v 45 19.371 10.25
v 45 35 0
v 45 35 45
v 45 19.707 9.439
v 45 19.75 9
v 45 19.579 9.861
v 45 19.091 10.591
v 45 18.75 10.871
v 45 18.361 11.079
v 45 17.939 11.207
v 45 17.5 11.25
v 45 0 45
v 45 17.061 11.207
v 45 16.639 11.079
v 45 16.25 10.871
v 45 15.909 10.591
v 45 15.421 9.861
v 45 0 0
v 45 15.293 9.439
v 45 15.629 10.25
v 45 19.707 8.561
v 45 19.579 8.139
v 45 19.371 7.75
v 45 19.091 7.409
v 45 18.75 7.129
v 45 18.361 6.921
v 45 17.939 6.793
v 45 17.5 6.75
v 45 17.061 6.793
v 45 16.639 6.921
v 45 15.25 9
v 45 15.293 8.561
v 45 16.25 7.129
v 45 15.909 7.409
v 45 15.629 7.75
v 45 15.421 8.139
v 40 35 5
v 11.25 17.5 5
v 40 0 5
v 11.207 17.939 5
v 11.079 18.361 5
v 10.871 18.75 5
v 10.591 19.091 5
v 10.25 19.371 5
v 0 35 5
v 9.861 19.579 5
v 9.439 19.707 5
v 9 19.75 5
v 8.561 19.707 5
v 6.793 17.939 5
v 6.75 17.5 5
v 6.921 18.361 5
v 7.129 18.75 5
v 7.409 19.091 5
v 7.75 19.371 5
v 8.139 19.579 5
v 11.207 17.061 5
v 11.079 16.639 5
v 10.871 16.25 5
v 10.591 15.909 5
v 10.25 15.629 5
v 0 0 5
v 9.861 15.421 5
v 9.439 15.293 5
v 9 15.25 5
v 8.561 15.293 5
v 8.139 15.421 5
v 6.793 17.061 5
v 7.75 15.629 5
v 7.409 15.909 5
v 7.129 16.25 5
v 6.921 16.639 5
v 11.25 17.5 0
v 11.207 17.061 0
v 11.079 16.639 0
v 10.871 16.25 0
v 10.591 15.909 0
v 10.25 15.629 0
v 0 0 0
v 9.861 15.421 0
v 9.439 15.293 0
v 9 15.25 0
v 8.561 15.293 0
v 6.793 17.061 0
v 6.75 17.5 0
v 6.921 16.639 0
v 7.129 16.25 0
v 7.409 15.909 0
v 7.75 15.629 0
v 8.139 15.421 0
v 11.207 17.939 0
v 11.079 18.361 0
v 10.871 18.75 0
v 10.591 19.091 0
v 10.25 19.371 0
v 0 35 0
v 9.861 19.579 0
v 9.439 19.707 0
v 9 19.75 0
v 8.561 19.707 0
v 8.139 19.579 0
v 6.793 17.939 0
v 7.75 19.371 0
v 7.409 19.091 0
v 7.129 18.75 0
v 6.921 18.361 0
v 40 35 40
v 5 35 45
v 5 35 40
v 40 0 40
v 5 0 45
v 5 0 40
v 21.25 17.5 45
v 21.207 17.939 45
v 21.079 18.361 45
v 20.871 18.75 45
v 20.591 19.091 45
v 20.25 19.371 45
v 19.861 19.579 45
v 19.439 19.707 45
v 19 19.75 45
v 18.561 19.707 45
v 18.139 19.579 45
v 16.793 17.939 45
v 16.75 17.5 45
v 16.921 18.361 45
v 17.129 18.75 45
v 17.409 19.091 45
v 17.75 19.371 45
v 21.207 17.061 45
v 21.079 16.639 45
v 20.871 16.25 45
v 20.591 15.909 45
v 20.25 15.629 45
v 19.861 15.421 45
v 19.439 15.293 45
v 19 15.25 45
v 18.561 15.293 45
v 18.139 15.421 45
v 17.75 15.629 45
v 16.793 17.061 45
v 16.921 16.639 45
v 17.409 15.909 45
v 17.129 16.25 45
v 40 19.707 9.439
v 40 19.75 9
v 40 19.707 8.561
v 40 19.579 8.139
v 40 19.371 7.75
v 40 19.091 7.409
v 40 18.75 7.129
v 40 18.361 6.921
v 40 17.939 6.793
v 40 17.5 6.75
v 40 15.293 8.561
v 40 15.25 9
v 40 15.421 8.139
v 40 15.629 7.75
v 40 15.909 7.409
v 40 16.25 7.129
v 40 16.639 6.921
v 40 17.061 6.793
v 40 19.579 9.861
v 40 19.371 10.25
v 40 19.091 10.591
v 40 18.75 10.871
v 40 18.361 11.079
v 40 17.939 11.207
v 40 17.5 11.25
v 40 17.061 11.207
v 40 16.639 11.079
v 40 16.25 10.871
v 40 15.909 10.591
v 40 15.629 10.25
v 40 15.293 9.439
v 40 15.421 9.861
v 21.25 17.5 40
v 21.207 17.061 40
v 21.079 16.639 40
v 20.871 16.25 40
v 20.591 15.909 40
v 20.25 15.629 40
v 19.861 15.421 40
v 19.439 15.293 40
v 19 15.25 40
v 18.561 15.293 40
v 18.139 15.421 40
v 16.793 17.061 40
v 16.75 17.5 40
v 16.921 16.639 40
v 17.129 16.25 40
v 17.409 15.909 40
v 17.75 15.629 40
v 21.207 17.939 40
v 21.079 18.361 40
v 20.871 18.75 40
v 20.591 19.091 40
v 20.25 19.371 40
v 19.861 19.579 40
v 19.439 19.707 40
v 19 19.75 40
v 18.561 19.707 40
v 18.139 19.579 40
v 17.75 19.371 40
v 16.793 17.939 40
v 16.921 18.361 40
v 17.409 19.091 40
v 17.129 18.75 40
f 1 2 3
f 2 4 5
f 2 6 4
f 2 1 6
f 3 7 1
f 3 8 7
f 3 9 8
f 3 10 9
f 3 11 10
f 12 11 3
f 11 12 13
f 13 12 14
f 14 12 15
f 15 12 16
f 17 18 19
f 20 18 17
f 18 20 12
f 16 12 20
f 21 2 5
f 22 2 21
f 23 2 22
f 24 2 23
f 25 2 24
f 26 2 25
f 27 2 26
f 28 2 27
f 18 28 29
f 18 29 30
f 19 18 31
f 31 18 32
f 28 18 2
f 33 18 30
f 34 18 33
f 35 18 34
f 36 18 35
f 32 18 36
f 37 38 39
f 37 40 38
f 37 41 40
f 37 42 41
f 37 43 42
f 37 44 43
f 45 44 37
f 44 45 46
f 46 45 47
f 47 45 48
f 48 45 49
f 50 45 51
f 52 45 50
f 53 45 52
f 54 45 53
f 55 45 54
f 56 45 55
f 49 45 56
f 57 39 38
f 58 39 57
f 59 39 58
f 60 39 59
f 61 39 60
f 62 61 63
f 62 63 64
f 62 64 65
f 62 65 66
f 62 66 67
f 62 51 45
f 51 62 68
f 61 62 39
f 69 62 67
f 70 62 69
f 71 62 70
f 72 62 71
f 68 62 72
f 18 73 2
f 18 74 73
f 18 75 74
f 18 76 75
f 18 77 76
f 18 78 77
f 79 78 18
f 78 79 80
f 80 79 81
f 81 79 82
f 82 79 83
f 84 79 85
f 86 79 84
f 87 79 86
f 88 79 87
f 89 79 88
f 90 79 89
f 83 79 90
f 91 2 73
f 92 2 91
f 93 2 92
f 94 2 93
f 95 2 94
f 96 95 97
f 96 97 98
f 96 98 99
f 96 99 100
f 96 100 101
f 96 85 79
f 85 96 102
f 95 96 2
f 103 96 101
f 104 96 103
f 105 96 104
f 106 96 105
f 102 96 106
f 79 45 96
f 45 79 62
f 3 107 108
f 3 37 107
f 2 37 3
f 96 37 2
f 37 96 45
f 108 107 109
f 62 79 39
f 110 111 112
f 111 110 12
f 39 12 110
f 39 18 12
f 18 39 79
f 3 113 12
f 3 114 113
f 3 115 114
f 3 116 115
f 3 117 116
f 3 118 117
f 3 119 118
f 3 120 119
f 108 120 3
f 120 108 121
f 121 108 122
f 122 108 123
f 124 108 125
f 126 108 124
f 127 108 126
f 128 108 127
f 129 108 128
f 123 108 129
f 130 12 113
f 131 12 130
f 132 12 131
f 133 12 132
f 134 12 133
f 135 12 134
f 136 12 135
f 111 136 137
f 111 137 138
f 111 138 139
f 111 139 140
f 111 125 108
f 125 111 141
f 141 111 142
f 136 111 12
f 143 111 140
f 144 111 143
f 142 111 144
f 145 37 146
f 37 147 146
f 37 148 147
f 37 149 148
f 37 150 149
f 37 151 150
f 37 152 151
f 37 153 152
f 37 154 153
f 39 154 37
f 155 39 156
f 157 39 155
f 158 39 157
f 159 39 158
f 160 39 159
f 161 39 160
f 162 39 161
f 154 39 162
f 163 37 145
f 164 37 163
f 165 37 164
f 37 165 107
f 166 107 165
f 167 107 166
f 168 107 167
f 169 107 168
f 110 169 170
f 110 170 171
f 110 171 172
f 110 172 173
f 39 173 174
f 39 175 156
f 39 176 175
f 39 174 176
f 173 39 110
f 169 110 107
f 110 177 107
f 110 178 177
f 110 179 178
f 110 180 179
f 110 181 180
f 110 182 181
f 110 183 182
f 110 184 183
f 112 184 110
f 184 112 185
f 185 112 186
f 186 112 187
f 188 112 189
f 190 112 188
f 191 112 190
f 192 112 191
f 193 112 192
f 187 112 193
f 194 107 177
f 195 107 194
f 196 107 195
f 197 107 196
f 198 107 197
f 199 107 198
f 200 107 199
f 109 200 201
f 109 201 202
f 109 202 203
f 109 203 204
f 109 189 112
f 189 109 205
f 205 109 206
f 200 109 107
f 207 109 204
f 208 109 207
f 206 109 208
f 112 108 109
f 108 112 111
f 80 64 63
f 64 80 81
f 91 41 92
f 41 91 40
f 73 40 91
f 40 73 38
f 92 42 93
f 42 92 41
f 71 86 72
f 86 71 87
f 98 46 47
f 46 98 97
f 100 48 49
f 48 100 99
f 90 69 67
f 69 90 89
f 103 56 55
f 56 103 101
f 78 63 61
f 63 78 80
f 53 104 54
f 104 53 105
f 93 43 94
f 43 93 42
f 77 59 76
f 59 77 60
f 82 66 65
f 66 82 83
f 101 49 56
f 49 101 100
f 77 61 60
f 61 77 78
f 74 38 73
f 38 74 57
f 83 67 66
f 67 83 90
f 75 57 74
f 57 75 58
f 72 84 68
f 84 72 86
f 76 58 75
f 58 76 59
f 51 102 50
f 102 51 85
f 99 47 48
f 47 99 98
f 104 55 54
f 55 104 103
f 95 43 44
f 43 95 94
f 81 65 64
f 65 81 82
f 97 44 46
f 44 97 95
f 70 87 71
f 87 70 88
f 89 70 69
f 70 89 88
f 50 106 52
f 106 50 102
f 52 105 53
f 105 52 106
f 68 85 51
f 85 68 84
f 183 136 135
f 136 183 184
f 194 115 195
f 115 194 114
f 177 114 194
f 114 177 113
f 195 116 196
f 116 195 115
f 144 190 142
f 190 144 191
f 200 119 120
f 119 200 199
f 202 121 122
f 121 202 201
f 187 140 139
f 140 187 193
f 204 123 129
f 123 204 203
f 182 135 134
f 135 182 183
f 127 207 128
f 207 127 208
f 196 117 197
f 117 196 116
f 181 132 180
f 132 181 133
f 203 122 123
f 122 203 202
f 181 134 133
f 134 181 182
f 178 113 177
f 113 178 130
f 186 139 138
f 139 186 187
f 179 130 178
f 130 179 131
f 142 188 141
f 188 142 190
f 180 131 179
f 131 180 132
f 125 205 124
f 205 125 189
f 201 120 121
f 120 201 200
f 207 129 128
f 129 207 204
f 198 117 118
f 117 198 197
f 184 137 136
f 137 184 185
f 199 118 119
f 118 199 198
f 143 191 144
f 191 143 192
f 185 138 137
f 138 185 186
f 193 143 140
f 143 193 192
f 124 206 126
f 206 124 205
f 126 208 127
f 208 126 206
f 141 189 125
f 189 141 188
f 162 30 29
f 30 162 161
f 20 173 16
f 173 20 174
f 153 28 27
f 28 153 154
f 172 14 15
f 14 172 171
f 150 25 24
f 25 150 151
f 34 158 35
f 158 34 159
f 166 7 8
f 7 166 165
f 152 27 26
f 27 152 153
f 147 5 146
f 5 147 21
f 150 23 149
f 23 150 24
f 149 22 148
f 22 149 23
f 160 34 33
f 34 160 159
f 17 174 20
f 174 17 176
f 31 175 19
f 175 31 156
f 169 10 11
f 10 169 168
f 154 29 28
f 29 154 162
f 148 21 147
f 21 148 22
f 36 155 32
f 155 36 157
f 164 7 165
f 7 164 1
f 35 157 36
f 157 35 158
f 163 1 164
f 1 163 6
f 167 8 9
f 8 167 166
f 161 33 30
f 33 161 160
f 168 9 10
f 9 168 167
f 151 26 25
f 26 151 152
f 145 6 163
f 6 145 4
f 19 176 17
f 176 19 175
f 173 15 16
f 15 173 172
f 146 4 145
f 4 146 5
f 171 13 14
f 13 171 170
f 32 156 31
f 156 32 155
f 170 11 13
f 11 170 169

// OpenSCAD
$fn = 32;

// ----------------------------------------------------------------------
// Z-bracket: 45 x 35 x 45 mm
// ----------------------------------------------------------------------

// --- parameters (mm) ---
foot_len = 45;            // lower foot length, X
top_len = 35;             // upper foot length, X
depth = 35;               // bracket width, Y
step_h = 45;              // overall rise, Z
plate_t = 5;              // plate thickness
hole_d = 4.5;             // clearance for M4

module hole_z(px, py, z0) {
  translate([px, py, z0 - 0.5]) cylinder(h = plate_t + 1, d = hole_d);
}
module hole_x(py, pz) {
  translate([-0.5, py, pz]) rotate([0, 90, 0]) cylinder(h = plate_t + 1, d = hole_d);
}

difference() {
  union() {
    cube([foot_len, depth, plate_t]);
    /* web, overlapping the lower foot */
    translate([foot_len - plate_t, 0, 0]) cube([plate_t, depth, step_h]);
    /* upper foot, sunk into the web */
    translate([foot_len - plate_t - top_len, 0, step_h - plate_t]) cube([top_len + plate_t, depth, plate_t]);
  }
  hole_z(9, 17.5, 0);
  translate([foot_len - plate_t - 21, 0, 0]) hole_z(0, 17.5, step_h - plate_t);
  translate([foot_len - plate_t, 0, 0]) hole_x(17.5, 9);
}
